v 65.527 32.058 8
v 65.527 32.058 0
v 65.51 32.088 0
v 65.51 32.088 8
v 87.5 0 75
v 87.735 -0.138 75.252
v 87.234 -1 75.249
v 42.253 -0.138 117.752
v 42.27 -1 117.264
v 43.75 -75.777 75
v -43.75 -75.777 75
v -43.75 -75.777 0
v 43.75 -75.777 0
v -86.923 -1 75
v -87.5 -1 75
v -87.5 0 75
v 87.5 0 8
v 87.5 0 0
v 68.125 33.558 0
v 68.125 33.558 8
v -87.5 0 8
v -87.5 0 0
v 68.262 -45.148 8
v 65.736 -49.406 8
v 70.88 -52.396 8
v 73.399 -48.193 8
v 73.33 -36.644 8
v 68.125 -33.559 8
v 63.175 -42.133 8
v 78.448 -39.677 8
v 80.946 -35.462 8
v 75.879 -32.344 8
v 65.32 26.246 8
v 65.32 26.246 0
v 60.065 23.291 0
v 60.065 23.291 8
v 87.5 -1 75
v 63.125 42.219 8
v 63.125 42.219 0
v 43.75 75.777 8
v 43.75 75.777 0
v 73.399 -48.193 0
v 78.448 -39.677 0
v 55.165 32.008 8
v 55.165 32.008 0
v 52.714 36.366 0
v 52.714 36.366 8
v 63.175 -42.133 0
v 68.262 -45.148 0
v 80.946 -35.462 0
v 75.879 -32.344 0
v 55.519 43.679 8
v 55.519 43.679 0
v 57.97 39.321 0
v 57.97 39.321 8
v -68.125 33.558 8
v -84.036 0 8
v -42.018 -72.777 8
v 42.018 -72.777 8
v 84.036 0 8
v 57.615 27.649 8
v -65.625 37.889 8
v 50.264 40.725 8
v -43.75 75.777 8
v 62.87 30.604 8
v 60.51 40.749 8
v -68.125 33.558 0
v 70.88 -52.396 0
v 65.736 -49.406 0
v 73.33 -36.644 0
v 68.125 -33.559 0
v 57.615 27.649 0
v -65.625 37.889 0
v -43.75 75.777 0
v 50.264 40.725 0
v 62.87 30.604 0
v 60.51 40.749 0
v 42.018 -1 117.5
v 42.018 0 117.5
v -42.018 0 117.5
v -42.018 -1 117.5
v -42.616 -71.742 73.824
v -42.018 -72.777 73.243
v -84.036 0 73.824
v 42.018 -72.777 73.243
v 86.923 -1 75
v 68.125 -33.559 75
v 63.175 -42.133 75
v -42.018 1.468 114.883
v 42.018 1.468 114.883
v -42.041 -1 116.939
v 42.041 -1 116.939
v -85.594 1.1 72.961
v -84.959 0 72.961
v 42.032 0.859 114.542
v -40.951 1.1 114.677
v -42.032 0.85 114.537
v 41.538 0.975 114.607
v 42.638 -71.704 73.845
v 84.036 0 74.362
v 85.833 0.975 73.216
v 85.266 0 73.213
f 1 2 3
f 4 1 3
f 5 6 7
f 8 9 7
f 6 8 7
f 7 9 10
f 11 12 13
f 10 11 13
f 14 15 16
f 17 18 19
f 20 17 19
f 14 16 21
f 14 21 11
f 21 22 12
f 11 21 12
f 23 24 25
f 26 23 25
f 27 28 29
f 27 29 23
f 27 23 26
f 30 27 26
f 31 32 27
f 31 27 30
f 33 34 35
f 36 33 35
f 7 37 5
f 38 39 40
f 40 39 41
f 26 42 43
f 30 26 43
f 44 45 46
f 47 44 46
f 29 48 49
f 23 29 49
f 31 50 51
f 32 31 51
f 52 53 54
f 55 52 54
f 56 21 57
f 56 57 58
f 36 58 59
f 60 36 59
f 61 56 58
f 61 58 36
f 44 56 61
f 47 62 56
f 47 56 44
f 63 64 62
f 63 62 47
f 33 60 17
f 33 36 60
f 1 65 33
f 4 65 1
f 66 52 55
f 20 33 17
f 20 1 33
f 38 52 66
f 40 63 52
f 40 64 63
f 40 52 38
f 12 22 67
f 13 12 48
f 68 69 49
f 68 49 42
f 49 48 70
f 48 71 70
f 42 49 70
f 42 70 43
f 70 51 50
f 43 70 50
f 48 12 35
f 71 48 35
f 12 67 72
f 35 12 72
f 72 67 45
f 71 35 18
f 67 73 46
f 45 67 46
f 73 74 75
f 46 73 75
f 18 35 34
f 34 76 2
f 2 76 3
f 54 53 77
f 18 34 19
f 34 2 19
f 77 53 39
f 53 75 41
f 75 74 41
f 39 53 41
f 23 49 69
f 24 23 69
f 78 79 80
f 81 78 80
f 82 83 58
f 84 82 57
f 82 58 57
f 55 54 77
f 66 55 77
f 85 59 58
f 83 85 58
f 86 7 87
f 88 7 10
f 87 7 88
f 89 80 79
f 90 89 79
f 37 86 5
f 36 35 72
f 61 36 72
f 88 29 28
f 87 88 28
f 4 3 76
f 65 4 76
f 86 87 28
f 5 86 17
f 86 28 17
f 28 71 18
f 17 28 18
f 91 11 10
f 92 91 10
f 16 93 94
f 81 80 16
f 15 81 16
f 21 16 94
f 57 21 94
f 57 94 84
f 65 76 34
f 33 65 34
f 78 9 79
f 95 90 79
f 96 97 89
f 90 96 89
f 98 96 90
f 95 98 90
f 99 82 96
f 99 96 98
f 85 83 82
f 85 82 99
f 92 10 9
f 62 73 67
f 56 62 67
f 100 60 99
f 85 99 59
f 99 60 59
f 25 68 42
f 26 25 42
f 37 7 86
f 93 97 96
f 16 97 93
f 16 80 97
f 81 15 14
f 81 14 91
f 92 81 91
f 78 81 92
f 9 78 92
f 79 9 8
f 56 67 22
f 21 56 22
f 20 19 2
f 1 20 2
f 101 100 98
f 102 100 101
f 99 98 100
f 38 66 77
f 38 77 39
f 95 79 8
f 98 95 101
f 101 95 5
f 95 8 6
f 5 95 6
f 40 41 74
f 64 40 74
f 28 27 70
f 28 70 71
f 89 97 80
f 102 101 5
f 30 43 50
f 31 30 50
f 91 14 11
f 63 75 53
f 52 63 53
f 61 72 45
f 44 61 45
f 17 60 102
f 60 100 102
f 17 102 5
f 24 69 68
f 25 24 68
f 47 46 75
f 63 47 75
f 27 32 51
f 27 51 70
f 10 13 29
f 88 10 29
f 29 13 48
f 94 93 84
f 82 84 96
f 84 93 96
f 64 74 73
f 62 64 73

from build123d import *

# Parameters (mm, degrees)
F0_W      = 50
F0_H      = 12.5
F1_DEPTH  = 8
F2_DEPTH  = 75
F4_DEPTH  = 8
F7_DEPTH  = 3
F8_DEPTH  = 1
F11_DEPTH = 3
F14_DEPTH = 3
F15_DEPTH = 8
F16_DEPTH = 8
F17_DEPTH = 8


# Not quite as in the source:
# - a feature names something its author has since deleted; it is built from what else it names


with BuildPart() as f1:
    # F0 (on Top) → F1 (new body)
    with BuildSketch(Plane.XY):
        Polygon((57.9695070384, 39.3207329262), (60.5095952989, 40.7487522591), (42.0179491924, 72.7772228311), (-42.0179491924, 72.7772228311), (-84.0358983849, 0), (-42.0179491924, -72.7772228311), (42.0179491924, -72.7772228311), (84.0358983849, 0), (65.5269237886, 32.0584843966), (65.5097997054, 32.0881441788), (62.870004896, 30.6039762231), (65.3204122546, 26.2455930623), (60.0654171506, 23.2910848888), (57.615009792, 27.6494680496), (55.164720758, 32.0079177338), (52.7144317239, 36.366367418), (50.2642610162, 40.7248836223), (55.5194165334, 43.6791064608), align=None)
        with Locations((0, 54.5829171234)):
            Rectangle(F0_W, F0_H, mode=Mode.SUBTRACT)
    extrude(amount=F1_DEPTH)

    # F0 (on Top) → F2 (join)
    with BuildSketch(Plane.XY):
        Polygon((-84.0358983849, 0), (-87.5, 0), (-43.75, -75.7772228311), (43.75, -75.7772228311), (63.1745123486, -42.1329805311), (68.1246734519, -33.5590499945), (87.5, 0), (84.0358983849, 0), (42.0179491924, -72.7772228311), (-42.0179491924, -72.7772228311), align=None)
    extrude(amount=F2_DEPTH)

    # F0 (on Top) → F4 (join)
    with BuildSketch(Plane.XY):
        Polygon((43.75, 75.7772228311), (-43.75, 75.7772228311), (-65.625, 37.8886114156), (-68.125, 33.5584843966), (-87.5, 0), (-84.0358983849, 0), (-42.0179491924, 72.7772228311), (42.0179491924, 72.7772228311), (60.5095952989, 40.7487522591), (63.1248363216, 42.2190219338), align=None)
    extrude(amount=F4_DEPTH)

    # F6 (on face) → F7 (join)
    with BuildSketch(Plane(origin=(0, -50.1312366318, 89.3836679776), x_dir=(1, 0, 0), z_dir=(0, 0.4891706574, -0.872188092))):
        Polygon((43.75, 29.4041920927), (0, 29.4041920927), (-43.75, 29.4041920927), (-42.01795, -57.4775522498), (42.01795, -57.4775522498), align=None)
    extrude(amount=F7_DEPTH)

    # F3 (on Front) → F8 (join)
    with BuildSketch(Plane.XZ):
        Polygon((-42.01795, 114.5), (0, 114.5), (42.01795, 114.5), (84.0359, 75), (87.5, 75), (42.01795, 117.5), (0, 117.5), (-42.01795, 117.5), (-87.5, 75), (-84.0359, 75), align=None)
    extrude(amount=F8_DEPTH)

    # F10 (on face) → F11 (join)
    with BuildSketch(Plane(origin=(-67.6846727043, -39.0777640058, 72.4338274863), x_dir=(0.7723629594, -0.3015876344, 0.5590173143), z_dir=(-0.6351814378, -0.3667221741, 0.6797495039))):
        Polygon((33.2314262259, 55.789645187), (-25.6554603702, 35.6104118215), (30.9888924807, -31.0804218073), align=None)
    extrude(amount=-F11_DEPTH)

    # F13 (on face) → F14 (join)
    with BuildSketch(Plane(origin=(67.6756688636, -39.5950852503, 72.4241918832), x_dir=(0.7733047167, 0.3041472681, -0.556322078), z_dir=(-0.6340345536, 0.3709553614, -0.6785221475))):
        Polygon((-30.939509805, 30.5117392321), (-32.8751652468, -56.3649154418), (25.9400068576, -35.9776056011), align=None)
    extrude(amount=F14_DEPTH)

    # F0 (on Top) → F15 (join)
    with BuildSketch(Plane.XY):
        with Locations((0, 54.5829171234)):
            Rectangle(F0_W, F0_H)
    extrude(amount=F15_DEPTH)

    # F0 (on Top) → F16 (join)
    with BuildSketch(Plane.XY):
        Polygon((75.878553621, -32.3439069124), (73.3299584755, -36.6440801541), (78.4478092981, -39.6772904524), (80.9460908184, -35.4620099819), align=None)
        Polygon((73.3299584755, -36.6440801541), (68.1246734519, -33.5590499945), (63.1745123486, -42.1329805311), (68.2616414678, -45.1481695385), (73.3985163623, -48.1928433322), (78.4478092981, -39.6772904524), align=None)
        Polygon((73.3985163623, -48.1928433322), (68.2616414678, -45.1481695385), (65.7363801019, -49.4055813149), (70.880193178, -52.396181094), align=None)
    extrude(amount=F16_DEPTH)

    # F0 (on Top) → F17 (join)
    with BuildSketch(Plane.XY):
        Polygon((87.5, 0), (68.125, 33.5584843966), (65.5269237886, 32.0584843966), (84.0358983849, 0), align=None)
    extrude(amount=F17_DEPTH)


solid = f1.part
